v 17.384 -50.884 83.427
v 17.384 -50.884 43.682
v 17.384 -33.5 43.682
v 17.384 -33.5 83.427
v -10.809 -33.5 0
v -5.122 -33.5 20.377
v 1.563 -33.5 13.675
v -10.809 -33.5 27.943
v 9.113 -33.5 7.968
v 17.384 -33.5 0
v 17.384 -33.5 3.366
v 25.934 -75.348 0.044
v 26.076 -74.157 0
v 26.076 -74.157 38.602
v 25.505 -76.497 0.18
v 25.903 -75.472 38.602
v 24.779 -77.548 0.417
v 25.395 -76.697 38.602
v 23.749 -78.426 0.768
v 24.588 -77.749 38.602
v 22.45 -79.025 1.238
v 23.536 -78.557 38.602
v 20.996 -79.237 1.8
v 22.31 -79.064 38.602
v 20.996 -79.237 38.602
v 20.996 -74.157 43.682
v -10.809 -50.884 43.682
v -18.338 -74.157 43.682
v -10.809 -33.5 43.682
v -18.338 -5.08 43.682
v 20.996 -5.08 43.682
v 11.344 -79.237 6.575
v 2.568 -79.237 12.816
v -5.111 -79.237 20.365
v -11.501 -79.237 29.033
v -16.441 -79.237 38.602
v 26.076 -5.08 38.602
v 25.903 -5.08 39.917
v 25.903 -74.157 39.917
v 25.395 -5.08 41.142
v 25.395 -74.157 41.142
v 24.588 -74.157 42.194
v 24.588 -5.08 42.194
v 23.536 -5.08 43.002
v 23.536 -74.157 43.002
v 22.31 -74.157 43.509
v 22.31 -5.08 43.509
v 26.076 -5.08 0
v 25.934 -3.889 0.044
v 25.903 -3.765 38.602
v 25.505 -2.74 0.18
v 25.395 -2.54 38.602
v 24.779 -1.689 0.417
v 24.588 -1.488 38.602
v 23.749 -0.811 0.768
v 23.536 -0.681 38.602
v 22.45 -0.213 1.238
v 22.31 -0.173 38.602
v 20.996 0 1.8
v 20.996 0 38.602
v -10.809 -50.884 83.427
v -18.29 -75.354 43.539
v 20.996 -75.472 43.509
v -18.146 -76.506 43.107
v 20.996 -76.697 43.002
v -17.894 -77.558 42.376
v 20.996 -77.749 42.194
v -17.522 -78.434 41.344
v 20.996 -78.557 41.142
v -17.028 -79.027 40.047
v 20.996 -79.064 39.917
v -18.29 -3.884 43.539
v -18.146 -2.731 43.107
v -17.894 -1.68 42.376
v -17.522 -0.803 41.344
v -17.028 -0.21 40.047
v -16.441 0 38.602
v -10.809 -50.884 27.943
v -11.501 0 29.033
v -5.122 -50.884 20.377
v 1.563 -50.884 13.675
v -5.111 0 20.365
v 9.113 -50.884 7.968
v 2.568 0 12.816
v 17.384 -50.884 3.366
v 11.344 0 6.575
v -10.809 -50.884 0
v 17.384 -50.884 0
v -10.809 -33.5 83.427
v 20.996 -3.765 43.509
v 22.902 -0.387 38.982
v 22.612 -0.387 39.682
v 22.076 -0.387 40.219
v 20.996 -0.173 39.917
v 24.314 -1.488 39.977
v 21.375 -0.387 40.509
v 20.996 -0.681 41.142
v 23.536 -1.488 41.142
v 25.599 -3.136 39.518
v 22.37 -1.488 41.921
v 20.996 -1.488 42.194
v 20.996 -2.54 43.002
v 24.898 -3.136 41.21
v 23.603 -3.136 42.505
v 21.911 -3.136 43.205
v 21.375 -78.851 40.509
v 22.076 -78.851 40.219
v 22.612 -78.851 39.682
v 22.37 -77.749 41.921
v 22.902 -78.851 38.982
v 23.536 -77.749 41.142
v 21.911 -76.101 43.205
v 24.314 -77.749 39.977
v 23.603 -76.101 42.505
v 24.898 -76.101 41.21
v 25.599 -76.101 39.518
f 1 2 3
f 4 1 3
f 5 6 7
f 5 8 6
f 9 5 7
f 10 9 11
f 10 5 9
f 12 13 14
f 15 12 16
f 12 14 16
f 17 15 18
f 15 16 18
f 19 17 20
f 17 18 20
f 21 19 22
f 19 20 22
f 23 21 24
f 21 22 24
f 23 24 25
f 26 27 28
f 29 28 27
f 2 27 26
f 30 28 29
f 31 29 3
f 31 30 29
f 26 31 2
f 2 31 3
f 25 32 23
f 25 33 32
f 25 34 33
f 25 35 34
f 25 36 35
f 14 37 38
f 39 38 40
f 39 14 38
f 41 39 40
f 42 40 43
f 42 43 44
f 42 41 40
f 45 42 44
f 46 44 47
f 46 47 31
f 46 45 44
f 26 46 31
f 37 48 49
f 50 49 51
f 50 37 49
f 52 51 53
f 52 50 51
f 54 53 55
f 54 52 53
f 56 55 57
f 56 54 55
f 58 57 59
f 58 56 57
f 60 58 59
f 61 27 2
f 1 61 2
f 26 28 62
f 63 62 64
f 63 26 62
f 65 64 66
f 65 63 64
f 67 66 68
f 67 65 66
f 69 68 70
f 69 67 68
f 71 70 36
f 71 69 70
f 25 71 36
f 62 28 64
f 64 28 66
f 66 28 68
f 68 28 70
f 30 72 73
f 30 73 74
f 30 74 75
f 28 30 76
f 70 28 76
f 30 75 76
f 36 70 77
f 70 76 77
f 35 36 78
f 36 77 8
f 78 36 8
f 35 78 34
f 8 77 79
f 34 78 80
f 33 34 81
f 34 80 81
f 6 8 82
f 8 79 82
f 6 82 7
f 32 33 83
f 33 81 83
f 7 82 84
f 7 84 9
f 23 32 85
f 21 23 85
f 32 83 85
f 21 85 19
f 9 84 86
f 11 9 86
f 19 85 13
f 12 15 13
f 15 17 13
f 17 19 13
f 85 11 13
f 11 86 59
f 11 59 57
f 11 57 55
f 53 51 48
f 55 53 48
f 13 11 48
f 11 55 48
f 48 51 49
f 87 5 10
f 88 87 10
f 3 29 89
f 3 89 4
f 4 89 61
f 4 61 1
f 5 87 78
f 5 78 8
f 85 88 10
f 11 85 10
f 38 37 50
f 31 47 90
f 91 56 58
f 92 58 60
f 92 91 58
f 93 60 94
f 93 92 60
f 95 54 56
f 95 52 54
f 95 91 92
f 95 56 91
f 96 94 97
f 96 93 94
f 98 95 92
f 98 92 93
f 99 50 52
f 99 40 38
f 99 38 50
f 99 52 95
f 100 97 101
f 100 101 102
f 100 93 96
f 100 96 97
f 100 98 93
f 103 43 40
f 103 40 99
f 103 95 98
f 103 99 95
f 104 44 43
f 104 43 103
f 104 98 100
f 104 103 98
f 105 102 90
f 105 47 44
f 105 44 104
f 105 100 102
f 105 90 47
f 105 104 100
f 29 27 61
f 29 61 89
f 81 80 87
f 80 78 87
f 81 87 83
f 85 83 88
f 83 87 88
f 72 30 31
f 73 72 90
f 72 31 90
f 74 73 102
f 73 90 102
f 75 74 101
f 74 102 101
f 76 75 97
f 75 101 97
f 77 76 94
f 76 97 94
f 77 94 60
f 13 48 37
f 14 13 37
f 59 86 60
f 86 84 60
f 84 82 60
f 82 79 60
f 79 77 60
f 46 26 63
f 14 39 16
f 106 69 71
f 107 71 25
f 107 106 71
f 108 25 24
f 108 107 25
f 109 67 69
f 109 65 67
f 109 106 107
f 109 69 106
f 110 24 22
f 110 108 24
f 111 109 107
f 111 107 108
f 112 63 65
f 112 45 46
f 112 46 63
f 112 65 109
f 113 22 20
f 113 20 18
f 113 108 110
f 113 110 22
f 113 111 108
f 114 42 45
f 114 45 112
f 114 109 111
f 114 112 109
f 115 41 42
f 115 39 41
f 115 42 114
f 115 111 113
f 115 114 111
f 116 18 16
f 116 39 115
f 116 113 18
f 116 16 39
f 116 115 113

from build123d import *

# Parameters (mm, degrees)
F0_W        = 47.8054173291
F0_H        = 43.6823405325
F1_DEPTH    = 79.23727
F2_T1_DEPTH = 403.639522146
F3_R        = 5.08
F4_W        = 28.1929401681
F4_H        = 17.383787781
F5_DEPTH    = 83.42686


# Not quite as in the source:
# - a fillet or chamfer that OpenCascade refuses, or shapes differently, is made with other operations: its cross-section is extruded or revolved along the edge and cut away or added


with BuildPart() as f1:
    # F0 (on Front) → F1 (new body)
    with BuildSketch(Plane.XZ):
        with Locations((2.172973007, 21.8411702663)):
            Rectangle(F0_W, F0_H)
    extrude(amount=F1_DEPTH)

    # F2: fillet of radius 67.9298616849 on 1 edges, made by hand

    # F2_s2 → F2_t1 (cut)
    with BuildSketch(Plane.XZ.offset(-162.201126073)):
        with BuildLine():
            ThreePointArc((-21.7297356576, 64.8804504292), (-8.4877009093, 24.5851939655), (26.0756816715, 0))
            Line((26.0756816715, 0), (-21.7297356576, 0))
            Line((-21.7297356576, 0), (-21.7297356576, 64.8804504292))
        make_face()
    extrude(amount=F2_T1_DEPTH, mode=Mode.SUBTRACT)

    # F3
    f3_edges = [f1.edges().sort_by_distance(p)[0] for p in [
        (26.075682, -39.618635, 43.682341),
        (3.869087, -79.23727, 43.682341),
        (26.075682, -79.23727, 21.84117),
        (26.075682, 0, 21.84117),
        (3.869087, 0, 43.682341),
    ]]
    fillet(f3_edges, radius=F3_R)

    # F4 (on Top) → F5 (join)
    with BuildSketch(Plane.XY):
        with Locations((3.2873195596, -42.192241177)):
            Rectangle(F4_W, F4_H)
    extrude(amount=F5_DEPTH)


solid = f1.part
